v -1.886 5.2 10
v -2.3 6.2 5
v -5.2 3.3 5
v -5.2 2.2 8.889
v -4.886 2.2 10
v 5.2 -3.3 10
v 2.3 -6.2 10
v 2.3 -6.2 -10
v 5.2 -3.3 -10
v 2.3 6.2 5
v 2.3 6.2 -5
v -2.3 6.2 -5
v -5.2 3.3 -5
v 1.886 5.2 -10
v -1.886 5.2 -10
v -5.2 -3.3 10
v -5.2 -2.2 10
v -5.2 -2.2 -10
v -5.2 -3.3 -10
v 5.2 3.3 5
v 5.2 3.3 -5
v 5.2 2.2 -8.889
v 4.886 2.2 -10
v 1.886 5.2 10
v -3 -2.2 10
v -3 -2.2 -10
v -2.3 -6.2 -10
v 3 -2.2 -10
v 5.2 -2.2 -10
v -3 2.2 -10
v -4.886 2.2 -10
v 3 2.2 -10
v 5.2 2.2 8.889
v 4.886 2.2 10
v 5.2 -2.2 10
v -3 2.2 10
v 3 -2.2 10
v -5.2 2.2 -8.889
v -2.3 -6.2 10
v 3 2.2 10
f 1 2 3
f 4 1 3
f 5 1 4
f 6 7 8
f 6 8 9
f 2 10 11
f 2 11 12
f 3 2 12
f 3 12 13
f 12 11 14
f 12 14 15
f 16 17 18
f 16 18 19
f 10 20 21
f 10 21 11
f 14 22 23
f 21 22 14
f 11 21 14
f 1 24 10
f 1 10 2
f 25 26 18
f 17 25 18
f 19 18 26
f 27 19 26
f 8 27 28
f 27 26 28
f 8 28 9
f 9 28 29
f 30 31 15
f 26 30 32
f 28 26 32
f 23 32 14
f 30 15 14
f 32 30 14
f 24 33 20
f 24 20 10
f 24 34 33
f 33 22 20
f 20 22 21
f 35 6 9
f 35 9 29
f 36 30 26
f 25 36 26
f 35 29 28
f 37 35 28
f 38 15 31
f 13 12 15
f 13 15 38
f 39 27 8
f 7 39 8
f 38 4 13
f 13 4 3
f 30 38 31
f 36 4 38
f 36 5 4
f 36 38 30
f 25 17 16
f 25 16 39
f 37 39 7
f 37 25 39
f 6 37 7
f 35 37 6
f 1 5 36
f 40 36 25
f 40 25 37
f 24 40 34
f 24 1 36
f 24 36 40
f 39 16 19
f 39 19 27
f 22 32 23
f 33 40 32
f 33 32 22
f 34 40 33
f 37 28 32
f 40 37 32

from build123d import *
from OCP.BRepFilletAPI import BRepFilletAPI_MakeChamfer

# Parameters (mm, degrees)
BOSS_EXTRUDE2_DEPTH = 10
CHAMFER1_SIZE       = 5
CHAMFER1_SIZE2      = 1
CHAMFER2_SIZE       = 1
CHAMFER2_SIZE2      = 5


with BuildPart() as part:
    # Sketch2 → Boss-Extrude2 (new, symmetric)
    with BuildSketch(Plane.XY):
        Polygon((5.2, 3.3), (2.3, 6.2), (-2.3, 6.2), (-5.2, 3.3), (-5.2, 2.2), (-3, 2.2), (-3, -2.2), (-5.2, -2.2), (-5.2, -3.3), (-2.3, -6.2), (2.3, -6.2), (5.2, -3.3), (5.2, -2.2), (3, -2.2), (3, 2.2), (5.2, 2.2), align=None)
    extrude(amount=BOSS_EXTRUDE2_DEPTH, both=True)

    # Chamfer1: one chamfer whose edges measure the first distance from different faces: ONE call of the kernel's chamfer builder (chamfer() names one face for all edges)
    chamfer1_edges_1 = [part.edges().sort_by_distance(p)[0] for p in [
        (-3.75, 4.75, 10),
    ]]
    chamfer1_side_1 = [part.faces().sort_by_distance(p)[0] for p in [
        (-3.75, 4.75, 0),
    ]]
    chamfer1_edges_2 = [part.edges().sort_by_distance(p)[0] for p in [
        (3.75, 4.75, 10),
    ]]
    chamfer1_side_2 = [part.faces().sort_by_distance(p)[0] for p in [
        (3.75, 4.75, 0),
    ]]
    chamfer1_edges_3 = [part.edges().sort_by_distance(p)[0] for p in [
        (0, 6.2, 10),
    ]]
    chamfer1_side_3 = [part.faces().sort_by_distance(p)[0] for p in [
        (0, 6.2, 0),
    ]]
    chamfer1 = BRepFilletAPI_MakeChamfer(part.part.solid().wrapped)
    for e in chamfer1_edges_1:
        chamfer1.Add(CHAMFER1_SIZE, CHAMFER1_SIZE2, e.wrapped, chamfer1_side_1[0].wrapped)  # the first distance lies on this face
    for e in chamfer1_edges_2:
        chamfer1.Add(CHAMFER1_SIZE, CHAMFER1_SIZE2, e.wrapped, chamfer1_side_2[0].wrapped)  # the first distance lies on this face
    for e in chamfer1_edges_3:
        chamfer1.Add(CHAMFER1_SIZE, CHAMFER1_SIZE2, e.wrapped, chamfer1_side_3[0].wrapped)  # the first distance lies on this face
    add(Compound.cast(chamfer1.Shape()), mode=Mode.REPLACE)

    # Chamfer2
    chamfer2_edges = [part.edges().sort_by_distance(p)[0] for p in [
        (-3.75, 4.75, -10),
        (0, 6.2, -10),
        (3.75, 4.75, -10),
    ]]
    chamfer2_side = [part.faces().sort_by_distance(p)[0] for p in [
        (0, 0, -10),
    ]]
    chamfer(chamfer2_edges, length=CHAMFER2_SIZE, length2=CHAMFER2_SIZE2, reference=chamfer2_side[0])


solid = part.part
